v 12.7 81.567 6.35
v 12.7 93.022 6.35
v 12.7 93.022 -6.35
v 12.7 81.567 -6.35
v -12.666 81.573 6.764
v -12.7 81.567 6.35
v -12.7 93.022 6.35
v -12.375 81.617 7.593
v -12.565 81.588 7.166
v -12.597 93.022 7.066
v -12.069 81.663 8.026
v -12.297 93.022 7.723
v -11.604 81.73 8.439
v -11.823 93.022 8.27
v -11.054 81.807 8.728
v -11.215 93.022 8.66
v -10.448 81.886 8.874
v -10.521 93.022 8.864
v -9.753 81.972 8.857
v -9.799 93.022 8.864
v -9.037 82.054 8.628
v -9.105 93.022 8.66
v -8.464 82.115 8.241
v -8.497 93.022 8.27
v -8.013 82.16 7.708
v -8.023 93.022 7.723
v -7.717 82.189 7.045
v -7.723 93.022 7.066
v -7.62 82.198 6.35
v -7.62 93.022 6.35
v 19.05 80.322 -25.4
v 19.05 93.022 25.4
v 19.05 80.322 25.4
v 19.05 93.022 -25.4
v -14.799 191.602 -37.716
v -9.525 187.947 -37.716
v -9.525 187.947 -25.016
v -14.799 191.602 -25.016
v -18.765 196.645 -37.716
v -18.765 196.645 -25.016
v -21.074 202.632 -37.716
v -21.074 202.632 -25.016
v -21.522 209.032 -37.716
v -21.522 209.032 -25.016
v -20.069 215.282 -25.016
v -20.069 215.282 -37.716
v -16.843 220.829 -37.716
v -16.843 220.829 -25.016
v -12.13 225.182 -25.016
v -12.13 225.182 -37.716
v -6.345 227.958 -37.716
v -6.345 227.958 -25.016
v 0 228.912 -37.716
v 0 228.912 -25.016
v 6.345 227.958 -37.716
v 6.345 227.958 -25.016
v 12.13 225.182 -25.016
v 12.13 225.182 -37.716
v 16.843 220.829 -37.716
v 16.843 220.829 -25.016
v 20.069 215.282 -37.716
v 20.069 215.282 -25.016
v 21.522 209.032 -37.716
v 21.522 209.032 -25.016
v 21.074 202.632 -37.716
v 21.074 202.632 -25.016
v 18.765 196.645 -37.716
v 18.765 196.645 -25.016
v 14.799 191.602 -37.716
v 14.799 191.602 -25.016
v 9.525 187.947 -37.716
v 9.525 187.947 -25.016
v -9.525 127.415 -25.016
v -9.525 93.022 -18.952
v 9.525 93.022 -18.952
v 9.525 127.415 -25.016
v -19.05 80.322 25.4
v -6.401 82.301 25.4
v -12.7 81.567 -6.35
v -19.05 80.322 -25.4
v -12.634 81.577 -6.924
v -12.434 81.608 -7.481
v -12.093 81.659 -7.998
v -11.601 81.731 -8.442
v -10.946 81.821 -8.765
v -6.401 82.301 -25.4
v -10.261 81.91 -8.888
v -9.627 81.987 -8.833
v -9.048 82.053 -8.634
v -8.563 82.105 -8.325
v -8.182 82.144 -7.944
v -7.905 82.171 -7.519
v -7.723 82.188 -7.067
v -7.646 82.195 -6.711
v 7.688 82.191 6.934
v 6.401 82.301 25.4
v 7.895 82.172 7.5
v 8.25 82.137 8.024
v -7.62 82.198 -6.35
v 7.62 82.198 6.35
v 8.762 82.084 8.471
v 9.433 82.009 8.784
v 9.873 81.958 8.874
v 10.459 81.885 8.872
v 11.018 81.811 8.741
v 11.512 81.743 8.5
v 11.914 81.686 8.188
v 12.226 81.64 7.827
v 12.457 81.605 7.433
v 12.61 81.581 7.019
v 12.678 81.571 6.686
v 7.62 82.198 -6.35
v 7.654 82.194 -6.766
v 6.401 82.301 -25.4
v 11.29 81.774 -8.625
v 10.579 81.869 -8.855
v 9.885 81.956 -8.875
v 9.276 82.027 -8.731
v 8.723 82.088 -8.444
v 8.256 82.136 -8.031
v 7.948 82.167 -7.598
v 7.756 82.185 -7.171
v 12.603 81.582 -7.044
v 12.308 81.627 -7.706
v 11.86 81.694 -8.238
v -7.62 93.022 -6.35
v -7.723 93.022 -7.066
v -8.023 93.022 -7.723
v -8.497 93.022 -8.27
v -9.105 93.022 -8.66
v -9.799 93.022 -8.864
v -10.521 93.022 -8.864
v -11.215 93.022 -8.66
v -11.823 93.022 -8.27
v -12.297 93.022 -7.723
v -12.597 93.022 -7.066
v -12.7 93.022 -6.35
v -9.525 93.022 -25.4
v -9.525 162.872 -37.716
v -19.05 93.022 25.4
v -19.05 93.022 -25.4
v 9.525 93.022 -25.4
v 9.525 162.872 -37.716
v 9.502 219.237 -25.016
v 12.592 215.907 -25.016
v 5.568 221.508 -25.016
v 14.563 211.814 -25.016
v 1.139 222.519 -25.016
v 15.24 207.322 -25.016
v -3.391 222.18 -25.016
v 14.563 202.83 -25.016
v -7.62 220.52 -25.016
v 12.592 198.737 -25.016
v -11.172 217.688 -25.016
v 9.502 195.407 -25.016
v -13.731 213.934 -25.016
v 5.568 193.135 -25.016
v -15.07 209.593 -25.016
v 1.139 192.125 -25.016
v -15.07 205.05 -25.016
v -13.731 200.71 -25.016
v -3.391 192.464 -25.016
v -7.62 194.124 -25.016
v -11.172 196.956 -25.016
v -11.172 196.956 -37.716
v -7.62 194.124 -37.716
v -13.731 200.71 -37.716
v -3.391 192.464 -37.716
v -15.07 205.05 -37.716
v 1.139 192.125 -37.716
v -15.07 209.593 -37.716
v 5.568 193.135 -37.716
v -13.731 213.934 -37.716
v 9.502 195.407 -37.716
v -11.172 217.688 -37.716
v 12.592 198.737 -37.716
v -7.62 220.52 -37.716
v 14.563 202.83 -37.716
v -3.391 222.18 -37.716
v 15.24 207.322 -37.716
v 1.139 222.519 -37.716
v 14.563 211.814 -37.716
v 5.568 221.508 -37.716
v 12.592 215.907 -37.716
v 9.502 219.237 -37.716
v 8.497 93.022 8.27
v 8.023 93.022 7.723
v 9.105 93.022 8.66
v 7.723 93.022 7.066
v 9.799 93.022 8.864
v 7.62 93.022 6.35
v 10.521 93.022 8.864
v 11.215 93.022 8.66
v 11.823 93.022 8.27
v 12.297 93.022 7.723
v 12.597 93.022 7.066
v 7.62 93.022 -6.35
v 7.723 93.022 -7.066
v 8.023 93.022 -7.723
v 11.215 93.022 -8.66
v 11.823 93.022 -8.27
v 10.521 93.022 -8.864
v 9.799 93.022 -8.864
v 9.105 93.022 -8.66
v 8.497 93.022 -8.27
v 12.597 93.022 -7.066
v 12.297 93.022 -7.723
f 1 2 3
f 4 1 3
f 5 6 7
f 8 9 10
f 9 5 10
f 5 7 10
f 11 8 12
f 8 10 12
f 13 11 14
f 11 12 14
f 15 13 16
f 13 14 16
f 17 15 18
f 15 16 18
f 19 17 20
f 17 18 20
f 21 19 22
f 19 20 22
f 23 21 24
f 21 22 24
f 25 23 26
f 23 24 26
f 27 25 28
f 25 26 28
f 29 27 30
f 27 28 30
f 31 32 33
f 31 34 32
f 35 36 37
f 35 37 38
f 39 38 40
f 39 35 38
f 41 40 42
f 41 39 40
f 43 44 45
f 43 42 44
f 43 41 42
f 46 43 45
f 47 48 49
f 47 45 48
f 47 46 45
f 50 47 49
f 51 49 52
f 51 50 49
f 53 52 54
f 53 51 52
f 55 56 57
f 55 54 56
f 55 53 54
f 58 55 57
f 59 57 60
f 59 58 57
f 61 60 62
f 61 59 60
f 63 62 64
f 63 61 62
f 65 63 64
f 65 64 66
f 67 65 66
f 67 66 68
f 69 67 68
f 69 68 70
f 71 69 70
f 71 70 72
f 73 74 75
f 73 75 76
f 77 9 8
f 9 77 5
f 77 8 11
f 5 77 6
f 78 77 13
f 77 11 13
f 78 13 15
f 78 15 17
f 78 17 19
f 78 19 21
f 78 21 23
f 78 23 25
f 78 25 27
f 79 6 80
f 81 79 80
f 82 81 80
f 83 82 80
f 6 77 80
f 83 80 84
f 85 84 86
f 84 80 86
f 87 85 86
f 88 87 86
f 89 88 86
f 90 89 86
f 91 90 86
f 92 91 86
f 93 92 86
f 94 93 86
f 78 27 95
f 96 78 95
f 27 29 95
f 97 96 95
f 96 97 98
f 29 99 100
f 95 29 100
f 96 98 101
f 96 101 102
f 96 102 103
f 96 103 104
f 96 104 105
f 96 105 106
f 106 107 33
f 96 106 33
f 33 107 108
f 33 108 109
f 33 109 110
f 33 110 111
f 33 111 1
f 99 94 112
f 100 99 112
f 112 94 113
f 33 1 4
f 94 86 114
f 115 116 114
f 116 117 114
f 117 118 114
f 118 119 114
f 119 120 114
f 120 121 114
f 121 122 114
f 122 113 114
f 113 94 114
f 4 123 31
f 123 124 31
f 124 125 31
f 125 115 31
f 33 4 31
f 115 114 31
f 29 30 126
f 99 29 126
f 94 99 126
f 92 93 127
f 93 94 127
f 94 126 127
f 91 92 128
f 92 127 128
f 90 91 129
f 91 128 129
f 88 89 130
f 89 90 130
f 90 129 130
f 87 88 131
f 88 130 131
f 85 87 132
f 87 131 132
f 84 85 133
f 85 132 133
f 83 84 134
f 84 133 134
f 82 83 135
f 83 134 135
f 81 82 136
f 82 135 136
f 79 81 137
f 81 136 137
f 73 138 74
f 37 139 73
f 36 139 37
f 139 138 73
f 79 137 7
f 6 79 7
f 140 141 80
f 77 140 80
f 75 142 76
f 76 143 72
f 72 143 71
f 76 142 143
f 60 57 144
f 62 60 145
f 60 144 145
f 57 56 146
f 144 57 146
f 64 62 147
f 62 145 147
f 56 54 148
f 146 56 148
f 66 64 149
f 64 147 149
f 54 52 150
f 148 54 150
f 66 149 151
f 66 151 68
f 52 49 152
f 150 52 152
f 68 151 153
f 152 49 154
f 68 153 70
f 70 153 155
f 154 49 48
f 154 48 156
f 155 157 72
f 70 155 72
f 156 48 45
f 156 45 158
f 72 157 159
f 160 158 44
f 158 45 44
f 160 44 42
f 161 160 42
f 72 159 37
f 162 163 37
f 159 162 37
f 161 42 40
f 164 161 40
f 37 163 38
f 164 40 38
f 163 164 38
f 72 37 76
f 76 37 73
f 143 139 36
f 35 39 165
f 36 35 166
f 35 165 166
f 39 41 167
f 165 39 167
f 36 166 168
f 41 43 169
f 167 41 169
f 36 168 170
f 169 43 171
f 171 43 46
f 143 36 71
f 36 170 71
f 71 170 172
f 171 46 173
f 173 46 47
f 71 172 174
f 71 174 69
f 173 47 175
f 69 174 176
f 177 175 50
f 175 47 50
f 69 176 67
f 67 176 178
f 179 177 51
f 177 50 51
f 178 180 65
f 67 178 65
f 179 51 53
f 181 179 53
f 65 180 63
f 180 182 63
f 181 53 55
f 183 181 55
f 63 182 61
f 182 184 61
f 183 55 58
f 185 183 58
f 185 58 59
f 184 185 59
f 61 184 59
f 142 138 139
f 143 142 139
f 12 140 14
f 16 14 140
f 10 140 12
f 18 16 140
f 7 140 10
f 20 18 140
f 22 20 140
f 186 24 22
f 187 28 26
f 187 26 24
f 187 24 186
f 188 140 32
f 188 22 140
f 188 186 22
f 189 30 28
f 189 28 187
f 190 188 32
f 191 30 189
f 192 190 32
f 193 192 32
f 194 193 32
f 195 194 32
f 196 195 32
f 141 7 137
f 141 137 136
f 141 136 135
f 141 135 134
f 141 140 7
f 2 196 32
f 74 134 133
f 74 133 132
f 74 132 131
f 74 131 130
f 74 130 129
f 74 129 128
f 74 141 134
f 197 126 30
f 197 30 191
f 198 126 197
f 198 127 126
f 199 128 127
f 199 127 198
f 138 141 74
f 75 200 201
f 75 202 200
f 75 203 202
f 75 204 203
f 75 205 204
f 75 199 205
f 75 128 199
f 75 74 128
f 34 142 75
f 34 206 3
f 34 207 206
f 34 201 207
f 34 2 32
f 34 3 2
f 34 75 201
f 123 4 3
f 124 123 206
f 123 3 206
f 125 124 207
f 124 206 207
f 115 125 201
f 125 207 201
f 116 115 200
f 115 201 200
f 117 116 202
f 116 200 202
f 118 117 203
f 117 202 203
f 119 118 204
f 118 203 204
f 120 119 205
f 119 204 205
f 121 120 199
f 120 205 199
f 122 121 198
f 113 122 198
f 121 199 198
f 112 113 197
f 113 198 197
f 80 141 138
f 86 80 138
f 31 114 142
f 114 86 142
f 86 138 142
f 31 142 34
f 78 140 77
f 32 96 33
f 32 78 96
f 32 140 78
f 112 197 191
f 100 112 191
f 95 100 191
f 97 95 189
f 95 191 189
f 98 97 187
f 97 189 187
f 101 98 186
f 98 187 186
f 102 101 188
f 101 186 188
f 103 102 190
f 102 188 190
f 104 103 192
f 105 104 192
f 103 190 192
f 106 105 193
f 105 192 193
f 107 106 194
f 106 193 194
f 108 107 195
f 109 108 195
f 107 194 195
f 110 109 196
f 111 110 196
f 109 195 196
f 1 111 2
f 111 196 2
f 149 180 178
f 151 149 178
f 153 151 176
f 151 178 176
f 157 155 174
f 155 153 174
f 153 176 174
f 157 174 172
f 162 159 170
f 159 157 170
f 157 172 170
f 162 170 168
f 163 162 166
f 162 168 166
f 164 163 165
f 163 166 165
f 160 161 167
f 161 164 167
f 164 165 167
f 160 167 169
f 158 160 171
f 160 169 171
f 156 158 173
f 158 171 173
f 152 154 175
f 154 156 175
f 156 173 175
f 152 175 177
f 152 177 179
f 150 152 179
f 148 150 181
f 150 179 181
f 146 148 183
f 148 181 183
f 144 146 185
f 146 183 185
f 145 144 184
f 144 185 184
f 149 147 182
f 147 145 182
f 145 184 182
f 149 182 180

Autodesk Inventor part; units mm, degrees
ref_plane "Work Plane3" through (19.05, 80.3219, 25.4) normal (0, 1, 0) x (-1, 0, 0)
ref_plane "Work Plane4" through (0, 228.9119, -25.0164) normal (0, 1, 0) x (-1, 0, 0)
sketch "Sketch1" plane through (0, 0, 0) normal (0, 0, 1) x (1, 0, 0)
  arc A0 (19.05, 80.3219) -> (-19.05, 80.3219) centre (0, 0) ccw
  line L0 (0, 0) -> (0, 152.4) construction
  line L1 (0, 93.0219) -> (19.05, 93.0219)
  line L2 (19.05, 93.0219) -> (19.05, 80.3219)
  line L3 (0, 93.0219) -> (-19.05, 93.0219)
  line L4 (-19.05, 93.0219) -> (-19.05, 80.3219)
  dimension "telescopeTubeDiameter" = 165.1
  dimension "d1" = 152.4
  dimension "d2" = 19.05
  dimension "d3" = 12.7
extrude "Extrusion1" add sketch "Sketch1" along normal mid plane 50.8
sketch "Sketch2" plane through (-19.05, 93.0219, 25.4) normal (0, 1, 0) x (1, 0, 0)
  line L0 (38.1, 0) -> (0, 0) construction
  line L1 (19.05, 0) -> (19.05, 50.8) construction
  line L2 (0, 50.8) -> (38.1, 50.8) construction
  line L3 (0, 50.8) -> (0, 0) construction
  line L4 (0, 25.4) -> (38.1, 25.4) construction
  line L5 (38.1, 50.8) -> (38.1, 0) construction
  line L6 (29.21, 19.05) -> (29.21, 31.75) construction
  line L7 (31.75, 19.05) -> (31.75, 31.75)
  line L8 (26.67, 31.75) -> (26.67, 19.05)
  arc A0 (26.67, 19.05) -> (31.75, 19.05) centre (29.21, 19.05) ccw
  arc A1 (31.75, 31.75) -> (26.67, 31.75) centre (29.21, 31.75) ccw
  point P0 (19.05, 25.4)
  point P1 (29.21, 25.4)
  dimension "d6" = 0
  dimension "d7" = 10.16
  dimension "d8" = 6.35
  dimension "d11" = 5.08
extrude "Extrusion2" cut sketch "Sketch2" against normal through all
mirror "Mirror1" about plane through (0, 0, 0) normal (1, 0, 0) of "Extrusion2"
sketch "Sketch3" plane through (0, 0, 0) normal (1, 0, 0) x (0, 1, 0)
  line L0 (93.0219, 25.4) -> (93.0219, -25.4) projected
  line L1 (80.3219, -25.4) -> (93.0219, -25.4) projected
  line L2 (162.8719, -25.4) -> (162.8719, -37.137) construction
  line L3 (93.0219, -25.4) -> (162.8719, -37.7164)
  line L4 (93.0219, -25.4) -> (162.8719, -25.4) construction
  line L5 (93.0219, -18.952) -> (162.8719, -31.2685)
  line L6 (162.8719, -31.2685) -> (162.8719, -37.7164)
  point P0 (0, 0)
  dimension "d13" = 69.85
  dimension "d14" = 10
  dimension "d15" = 6.35
extrude "Extrusion3" add sketch "Sketch3" along normal mid plane 19.05
ref_plane "Work Plane1" through (9.525, 162.8719, -37.7164) normal (0, 0, 1) x (1, 0, 0)
sketch "Sketch4" plane through (9.525, 162.8719, -37.7164) normal (0, 0, 1) x (1, 0, 0)
  line L0 (0, 0) -> (-19.05, 0) projected
  line L1 (-19.05, 0) -> (0, 0) construction
  line L2 (-9.525, 0) -> (-9.525, 50.8) construction
  circle A0 centre (-9.525, 44.45) radius 15.24
  arc A1 (0, 25.0747) -> (-19.05, 25.0747) centre (-9.525, 44.45) ccw
  line L3 (0, 0) -> (0, 25.0747)
  line L4 (-19.05, 0) -> (-19.05, 25.0747)
  point P0 (-9.525, -162.8719)
  dimension "d18" = 50.8
  dimension "d19" = 30.48
  dimension "d20" = 6.35
  dimension "d25" = 44.45
extrude "Extrusion4" add sketch "Sketch4" along normal blind 12.7
sketch "Sketch7" plane through (0, 0, 0) normal (1, 0, 0) x (0, 1, 0)
  line L0 (93.0219, -18.952) -> (162.8719, -31.2685) projected
  line L1 (162.8719, -31.2685) -> (162.8719, -25.0164) projected
  line L2 (162.8719, -25.0164) -> (127.4148, -25.0164)
  line L3 (127.4148, -25.0164) -> (162.8719, -31.2685)
  line L4 (187.9465, -25.0164) -> (162.8719, -25.0164) projected
  line L5 (162.8719, -31.2685) -> (162.8719, -25.0164)
  point P0 (0, 0)
extrude "Extrusion5" add sketch "Sketch7" along normal mid plane 19.05
sketch "Sketch8" plane through (0, 0, 0) normal (1, 0, 0) x (0, 1, 0)
  line L0 (162.8719, 31.2685) -> (162.8719, 25.0164) projected
  line L1 (93.0219, 18.952) -> (162.8719, 31.2685) projected
  line L2 (162.8719, 25.0164) -> (127.4148, 25.0164)
  line L3 (127.4148, 25.0164) -> (162.8719, 31.2685)
  line L4 (162.8719, 31.2685) -> (162.8719, 25.0164)
  point P0 (0, 0)
sketch "Sketch9" plane through (0, 0, 0) normal (1, 0, 0) x (0, 1, 0)
  line L0 (187.9465, 25.0164) -> (127.4148, 25.0164) projected
  line L1 (93.0219, -18.952) -> (93.0219, -25.4) projected
  line L2 (93.0219, 18.952) -> (93.0219, -18.952)
  line L3 (93.0219, -18.952) -> (127.4148, -25.0164) projected
  line L4 (93.0219, -18.952) -> (127.4148, -25.0164)
  line L5 (187.9465, -25.0164) -> (127.4148, -25.0164) projected
  line L6 (127.4148, -25.0164) -> (187.9465, -25.0164)
  line L7 (187.9465, -25.0164) -> (187.9465, 25.0164)
  line L8 (93.0219, 18.952) -> (127.4148, 25.0164) projected
  line L9 (187.9465, 25.0164) -> (127.4148, 25.0164)
  point P0 (0, 0)
sketch "Sketch14" plane through (0, 228.9119, -25.0164) normal (0, 1, 0) x (-1, 0, 0)
  circle A0 centre (0, -6.35) radius 2.0193
  line L0 (21.59, -12.7) -> (-21.59, -12.7) projected
  circle A1 centre (0, 56.3829) radius 2.0193
  line L1 (21.59, 62.7329) -> (-21.59, 62.7329) projected
  point P0 (0, 25.0164)
  point P1 (-9.525, -12.7)
  point P2 (9.525, -12.7)
  point P3 (-9.525, 62.7329)
  point P4 (9.525, 62.7329)
  dimension "d74" = 4.0386
  dimension "d75" = 6.35
  dimension "d76" = 6.35
sketch "Sketch16" plane through (0, 222.4275, -31.3664) normal (-1, 0, 0) x (0, 0, 1)
  line L0 (2.0193, 0) -> (2.0193, 6.4844)
  line L1 (2.0193, 6.4844) -> (1.4308, 6.4844)
  line L2 (1.4308, 6.4844) -> (1.4308, 0)
  line L3 (1.4308, 0) -> (2.0193, 0)
  line L4 (0, -171.8239) -> (0, 36.2042) projected
sketch "Sketch15" plane through (0, 222.4275, -29.3471) normal (1, 0, 0) x (0, 1, 0)
  line L0 (-0.4631, -0.0403) -> (-0.397, -0.0403) construction
  line L1 (0.066, -0.5486) -> (-0.0001, -0.6756) construction
  line L2 (-0.7939, -0.6756) -> (-0.86, -0.5486) construction
  line L3 (-0.3308, -0.0403) -> (-0.397, 0.0868) construction
  line L4 (-0.397, 0.0868) -> (-0.4631, -0.0403) construction
  line L5 (-0.7939, -0.6756) -> (-0.7277, -0.5486) construction
  line L6 (-0.3308, -0.0403) -> (-0.0662, -0.5486)
  line L7 (-0.86, -0.5486) -> (-0.7277, -0.5486) construction
  arc A0 (-0.86, -0.5486) -> (-0.7939, -0.5887) centre (-0.7939, -0.5141) ccw construction
  line L8 (0.066, -0.5486) -> (-0.0662, -0.5486) construction
  line L9 (-0.7939, -0.6756) -> (-0.7939, -0.5486) construction
  line L10 (-0.0001, -0.6756) -> (-0.0001, -0.5486) construction
  line L11 (-0.397, 0.0868) -> (-0.397, -0.0002) construction
  line L12 (-0.7939, -0.5887) -> (-0.0001, -0.5887)
  arc A1 (-0.7939, -0.5887) -> (-0.7277, -0.5486) centre (-0.7939, -0.5141) ccw
  line L13 (-0.0662, -0.5486) -> (-0.0001, -0.6756) construction
  line L14 (-0.7277, -0.5486) -> (-0.4631, -0.0403)
  line L15 (-0.0001, -0.0002) -> (-0.0001, 0.0177)
  line L16 (-0.0001, 0.0177) -> (-0.0001, -0.0002)
  line L17 (-0.0001, -0.0002) -> (0.0334, -0.0002)
  arc A2 (-0.0662, -0.5486) -> (-0.0001, -0.5887) centre (-0.0001, -0.5141) ccw
  arc A3 (-0.0001, -0.5887) -> (0.066, -0.5486) centre (-0.0001, -0.5141) ccw construction
  arc A4 (-0.397, -0.0002) -> (-0.4631, -0.0403) centre (-0.397, -0.0747) ccw
  arc A5 (-0.3308, -0.0403) -> (-0.397, -0.0002) centre (-0.397, -0.0747) ccw
  line L18 (-0.397, -0.0002) -> (-0.397, -0.0403) construction
  line L19 (-0.397, -0.0403) -> (-0.3308, -0.0403) construction
  dimension "d94" = 55
  dimension "d95" = 0.1271
  dimension "d96" = 0.1271
  dimension "Sketch15_ThreadOffset" = 0
  dimension "Sketch15_MajorRadius" = 0.5885
  dimension "d99" = 0.7937
  dimension "Sketch15_MinorRadius" = 0
sketch "Sketch18" plane through (0, 222.4275, 31.3664) normal (-1, 0, 0) x (0, 0, 1)
  line L0 (2.0193, 0) -> (2.0193, 6.4844)
  line L1 (2.0193, 6.4844) -> (1.4308, 6.4844)
  line L2 (1.4308, 6.4844) -> (1.4308, 0)
  line L3 (1.4308, 0) -> (2.0193, 0)
  line L4 (0, -171.8765) -> (0, 36.5199) projected
sketch "Sketch17" plane through (0, 222.4275, 33.3857) normal (1, 0, 0) x (0, 1, 0)
  line L0 (-0.4631, -0.0403) -> (-0.397, -0.0403) construction
  line L1 (0.066, -0.5486) -> (-0.0001, -0.6756) construction
  line L2 (-0.7939, -0.6756) -> (-0.86, -0.5486) construction
  line L3 (-0.3308, -0.0403) -> (-0.397, 0.0868) construction
  line L4 (-0.397, 0.0868) -> (-0.4631, -0.0403) construction
  line L5 (-0.7939, -0.6756) -> (-0.7277, -0.5486) construction
  line L6 (-0.3308, -0.0403) -> (-0.0662, -0.5486)
  line L7 (-0.86, -0.5486) -> (-0.7277, -0.5486) construction
  arc A0 (-0.86, -0.5486) -> (-0.7939, -0.5887) centre (-0.7939, -0.5141) ccw construction
  line L8 (0.066, -0.5486) -> (-0.0662, -0.5486) construction
  line L9 (-0.7939, -0.6756) -> (-0.7939, -0.5486) construction
  line L10 (-0.0001, -0.6756) -> (-0.0001, -0.5486) construction
  line L11 (-0.397, 0.0868) -> (-0.397, -0.0002) construction
  line L12 (-0.7939, -0.5887) -> (-0.0001, -0.5887)
  arc A1 (-0.7939, -0.5887) -> (-0.7277, -0.5486) centre (-0.7939, -0.5141) ccw
  line L13 (-0.0662, -0.5486) -> (-0.0001, -0.6756) construction
  line L14 (-0.7277, -0.5486) -> (-0.4631, -0.0403)
  line L15 (-0.0001, -0.0002) -> (-0.0001, 0.0177)
  line L16 (-0.0001, 0.0177) -> (-0.0001, -0.0002)
  line L17 (-0.0001, -0.0002) -> (0.0334, -0.0002)
  arc A2 (-0.0662, -0.5486) -> (-0.0001, -0.5887) centre (-0.0001, -0.5141) ccw
  arc A3 (-0.0001, -0.5887) -> (0.066, -0.5486) centre (-0.0001, -0.5141) ccw construction
  arc A4 (-0.397, -0.0002) -> (-0.4631, -0.0403) centre (-0.397, -0.0747) ccw
  arc A5 (-0.3308, -0.0403) -> (-0.397, -0.0002) centre (-0.397, -0.0747) ccw
  line L18 (-0.397, -0.0002) -> (-0.397, -0.0403) construction
  line L19 (-0.397, -0.0403) -> (-0.3308, -0.0403) construction
  dimension "d112" = 55
  dimension "d113" = 0.1271
  dimension "d114" = 0.1271
  dimension "Sketch17_ThreadOffset" = 0
  dimension "Sketch17_MajorRadius" = 0.5885
  dimension "d117" = 0.7937
  dimension "Sketch17_MinorRadius" = 0
sketch "Sketch20" plane through (13.0819, 199.769, -31.3664) normal (0.5, 0.866, 0) x (0, 0, 1)
  line L0 (2.0193, 0) -> (2.0193, 6.4844)
  line L1 (2.0193, 6.4844) -> (1.4308, 6.4844)
  line L2 (1.4308, 6.4844) -> (1.4308, 0)
  line L3 (1.4308, 0) -> (2.0193, 0)
  line L4 (0, -67.0949) -> (0, 89.4563) projected
sketch "Sketch19" plane through (13.0819, 199.769, -29.3471) normal (-0.5, -0.866, 0) x (0.866, -0.5, 0)
  line L0 (-0.4631, -0.0403) -> (-0.397, -0.0403) construction
  line L1 (0.066, -0.5486) -> (-0.0001, -0.6756) construction
  line L2 (-0.7939, -0.6756) -> (-0.86, -0.5486) construction
  line L3 (-0.3308, -0.0403) -> (-0.397, 0.0868) construction
  line L4 (-0.397, 0.0868) -> (-0.4631, -0.0403) construction
  line L5 (-0.7939, -0.6756) -> (-0.7277, -0.5486) construction
  line L6 (-0.3308, -0.0403) -> (-0.0662, -0.5486)
  line L7 (-0.86, -0.5486) -> (-0.7277, -0.5486) construction
  arc A0 (-0.86, -0.5486) -> (-0.7939, -0.5887) centre (-0.7939, -0.5141) ccw construction
  line L8 (0.066, -0.5486) -> (-0.0662, -0.5486) construction
  line L9 (-0.7939, -0.6756) -> (-0.7939, -0.5486) construction
  line L10 (-0.0001, -0.6756) -> (-0.0001, -0.5486) construction
  line L11 (-0.397, 0.0868) -> (-0.397, -0.0002) construction
  line L12 (-0.7939, -0.5887) -> (-0.0001, -0.5887)
  arc A1 (-0.7939, -0.5887) -> (-0.7277, -0.5486) centre (-0.7939, -0.5141) ccw
  line L13 (-0.0662, -0.5486) -> (-0.0001, -0.6756) construction
  line L14 (-0.7277, -0.5486) -> (-0.4631, -0.0403)
  line L15 (-0.0001, -0.0002) -> (-0.0001, 0.0177)
  line L16 (-0.0001, 0.0177) -> (-0.0001, -0.0002)
  line L17 (-0.0001, -0.0002) -> (0.0334, -0.0002)
  arc A2 (-0.0662, -0.5486) -> (-0.0001, -0.5887) centre (-0.0001, -0.5141) ccw
  arc A3 (-0.0001, -0.5887) -> (0.066, -0.5486) centre (-0.0001, -0.5141) ccw construction
  arc A4 (-0.397, -0.0002) -> (-0.4631, -0.0403) centre (-0.397, -0.0747) ccw
  arc A5 (-0.3308, -0.0403) -> (-0.397, -0.0002) centre (-0.397, -0.0747) ccw
  line L18 (-0.397, -0.0002) -> (-0.397, -0.0403) construction
  line L19 (-0.397, -0.0403) -> (-0.3308, -0.0403) construction
  dimension "d130" = 55
  dimension "d131" = 0.1271
  dimension "d132" = 0.1271
  dimension "Sketch19_ThreadOffset" = 0
  dimension "Sketch19_MajorRadius" = 0.5885
  dimension "d135" = 0.7937
  dimension "Sketch19_MinorRadius" = 0
sketch "Sketch22" plane through (-13.0819, 199.769, -31.3664) normal (0.5, -0.866, 0) x (0, 0, 1)
  line L0 (2.0193, 0) -> (2.0193, 6.4844)
  line L1 (2.0193, 6.4844) -> (1.4308, 6.4844)
  line L2 (1.4308, 6.4844) -> (1.4308, 0)
  line L3 (1.4308, 0) -> (2.0193, 0)
  line L4 (0, -67.0949) -> (0, 89.4563) projected
sketch "Sketch21" plane through (-13.0819, 199.769, -29.3471) normal (-0.5, 0.866, 0) x (-0.866, -0.5, 0)
  line L0 (-0.4631, -0.0403) -> (-0.397, -0.0403) construction
  line L1 (0.066, -0.5486) -> (-0.0001, -0.6756) construction
  line L2 (-0.7939, -0.6756) -> (-0.86, -0.5486) construction
  line L3 (-0.3308, -0.0403) -> (-0.397, 0.0868) construction
  line L4 (-0.397, 0.0868) -> (-0.4631, -0.0403) construction
  line L5 (-0.7939, -0.6756) -> (-0.7277, -0.5486) construction
  line L6 (-0.3308, -0.0403) -> (-0.0662, -0.5486)
  line L7 (-0.86, -0.5486) -> (-0.7277, -0.5486) construction
  arc A0 (-0.86, -0.5486) -> (-0.7939, -0.5887) centre (-0.7939, -0.5141) ccw construction
  line L8 (0.066, -0.5486) -> (-0.0662, -0.5486) construction
  line L9 (-0.7939, -0.6756) -> (-0.7939, -0.5486) construction
  line L10 (-0.0001, -0.6756) -> (-0.0001, -0.5486) construction
  line L11 (-0.397, 0.0868) -> (-0.397, -0.0002) construction
  line L12 (-0.7939, -0.5887) -> (-0.0001, -0.5887)
  arc A1 (-0.7939, -0.5887) -> (-0.7277, -0.5486) centre (-0.7939, -0.5141) ccw
  line L13 (-0.0662, -0.5486) -> (-0.0001, -0.6756) construction
  line L14 (-0.7277, -0.5486) -> (-0.4631, -0.0403)
  line L15 (-0.0001, -0.0002) -> (-0.0001, 0.0177)
  line L16 (-0.0001, 0.0177) -> (-0.0001, -0.0002)
  line L17 (-0.0001, -0.0002) -> (0.0334, -0.0002)
  arc A2 (-0.0662, -0.5486) -> (-0.0001, -0.5887) centre (-0.0001, -0.5141) ccw
  arc A3 (-0.0001, -0.5887) -> (0.066, -0.5486) centre (-0.0001, -0.5141) ccw construction
  arc A4 (-0.397, -0.0002) -> (-0.4631, -0.0403) centre (-0.397, -0.0747) ccw
  arc A5 (-0.3308, -0.0403) -> (-0.397, -0.0002) centre (-0.397, -0.0747) ccw
  line L18 (-0.397, -0.0002) -> (-0.397, -0.0403) construction
  line L19 (-0.397, -0.0403) -> (-0.3308, -0.0403) construction
  dimension "d148" = 55
  dimension "d149" = 0.1271
  dimension "d150" = 0.1271
  dimension "Sketch21_ThreadOffset" = 0
  dimension "Sketch21_MajorRadius" = 0.5885
  dimension "d153" = 0.7937
  dimension "Sketch21_MinorRadius" = 0
sketch "Sketch24" plane through (13.0819, 199.769, 31.3664) normal (0.5, 0.866, 0) x (0, 0, 1)
  line L0 (2.0193, 0) -> (2.0193, 6.4844)
  line L1 (2.0193, 6.4844) -> (1.4308, 6.4844)
  line L2 (1.4308, 6.4844) -> (1.4308, 0)
  line L3 (1.4308, 0) -> (2.0193, 0)
  line L4 (0, -67.0949) -> (0, 89.4563) projected
sketch "Sketch23" plane through (13.0819, 199.769, 33.3857) normal (-0.5, -0.866, 0) x (0.866, -0.5, 0)
  line L0 (-0.4631, -0.0403) -> (-0.397, -0.0403) construction
  line L1 (0.066, -0.5486) -> (-0.0001, -0.6756) construction
  line L2 (-0.7939, -0.6756) -> (-0.86, -0.5486) construction
  line L3 (-0.3308, -0.0403) -> (-0.397, 0.0868) construction
  line L4 (-0.397, 0.0868) -> (-0.4631, -0.0403) construction
  line L5 (-0.7939, -0.6756) -> (-0.7277, -0.5486) construction
  line L6 (-0.3308, -0.0403) -> (-0.0662, -0.5486)
  line L7 (-0.86, -0.5486) -> (-0.7277, -0.5486) construction
  arc A0 (-0.86, -0.5486) -> (-0.7939, -0.5887) centre (-0.7939, -0.5141) ccw construction
  line L8 (0.066, -0.5486) -> (-0.0662, -0.5486) construction
  line L9 (-0.7939, -0.6756) -> (-0.7939, -0.5486) construction
  line L10 (-0.0001, -0.6756) -> (-0.0001, -0.5486) construction
  line L11 (-0.397, 0.0868) -> (-0.397, -0.0002) construction
  line L12 (-0.7939, -0.5887) -> (-0.0001, -0.5887)
  arc A1 (-0.7939, -0.5887) -> (-0.7277, -0.5486) centre (-0.7939, -0.5141) ccw
  line L13 (-0.0662, -0.5486) -> (-0.0001, -0.6756) construction
  line L14 (-0.7277, -0.5486) -> (-0.4631, -0.0403)
  line L15 (-0.0001, -0.0002) -> (-0.0001, 0.0177)
  line L16 (-0.0001, 0.0177) -> (-0.0001, -0.0002)
  line L17 (-0.0001, -0.0002) -> (0.0334, -0.0002)
  arc A2 (-0.0662, -0.5486) -> (-0.0001, -0.5887) centre (-0.0001, -0.5141) ccw
  arc A3 (-0.0001, -0.5887) -> (0.066, -0.5486) centre (-0.0001, -0.5141) ccw construction
  arc A4 (-0.397, -0.0002) -> (-0.4631, -0.0403) centre (-0.397, -0.0747) ccw
  arc A5 (-0.3308, -0.0403) -> (-0.397, -0.0002) centre (-0.397, -0.0747) ccw
  line L18 (-0.397, -0.0002) -> (-0.397, -0.0403) construction
  line L19 (-0.397, -0.0403) -> (-0.3308, -0.0403) construction
  dimension "d166" = 55
  dimension "d167" = 0.1271
  dimension "d168" = 0.1271
  dimension "Sketch23_ThreadOffset" = 0
  dimension "Sketch23_MajorRadius" = 0.5885
  dimension "d171" = 0.7937
  dimension "Sketch23_MinorRadius" = 0
sketch "Sketch26" plane through (-13.0819, 199.769, 31.3664) normal (0.5, -0.866, 0) x (0, 0, 1)
  line L0 (2.0193, 0) -> (2.0193, 6.4844)
  line L1 (2.0193, 6.4844) -> (1.4308, 6.4844)
  line L2 (1.4308, 6.4844) -> (1.4308, 0)
  line L3 (1.4308, 0) -> (2.0193, 0)
  line L4 (0, -67.0949) -> (0, 89.4563) projected
sketch "Sketch25" plane through (-13.0819, 199.769, 33.3857) normal (-0.5, 0.866, 0) x (-0.866, -0.5, 0)
  line L0 (-0.4631, -0.0403) -> (-0.397, -0.0403) construction
  line L1 (0.066, -0.5486) -> (-0.0001, -0.6756) construction
  line L2 (-0.7939, -0.6756) -> (-0.86, -0.5486) construction
  line L3 (-0.3308, -0.0403) -> (-0.397, 0.0868) construction
  line L4 (-0.397, 0.0868) -> (-0.4631, -0.0403) construction
  line L5 (-0.7939, -0.6756) -> (-0.7277, -0.5486) construction
  line L6 (-0.3308, -0.0403) -> (-0.0662, -0.5486)
  line L7 (-0.86, -0.5486) -> (-0.7277, -0.5486) construction
  arc A0 (-0.86, -0.5486) -> (-0.7939, -0.5887) centre (-0.7939, -0.5141) ccw construction
  line L8 (0.066, -0.5486) -> (-0.0662, -0.5486) construction
  line L9 (-0.7939, -0.6756) -> (-0.7939, -0.5486) construction
  line L10 (-0.0001, -0.6756) -> (-0.0001, -0.5486) construction
  line L11 (-0.397, 0.0868) -> (-0.397, -0.0002) construction
  line L12 (-0.7939, -0.5887) -> (-0.0001, -0.5887)
  arc A1 (-0.7939, -0.5887) -> (-0.7277, -0.5486) centre (-0.7939, -0.5141) ccw
  line L13 (-0.0662, -0.5486) -> (-0.0001, -0.6756) construction
  line L14 (-0.7277, -0.5486) -> (-0.4631, -0.0403)
  line L15 (-0.0001, -0.0002) -> (-0.0001, 0.0177)
  line L16 (-0.0001, 0.0177) -> (-0.0001, -0.0002)
  line L17 (-0.0001, -0.0002) -> (0.0334, -0.0002)
  arc A2 (-0.0662, -0.5486) -> (-0.0001, -0.5887) centre (-0.0001, -0.5141) ccw
  arc A3 (-0.0001, -0.5887) -> (0.066, -0.5486) centre (-0.0001, -0.5141) ccw construction
  arc A4 (-0.397, -0.0002) -> (-0.4631, -0.0403) centre (-0.397, -0.0747) ccw
  arc A5 (-0.3308, -0.0403) -> (-0.397, -0.0002) centre (-0.397, -0.0747) ccw
  line L18 (-0.397, -0.0002) -> (-0.397, -0.0403) construction
  line L19 (-0.397, -0.0403) -> (-0.3308, -0.0403) construction
  dimension "d184" = 55
  dimension "d185" = 0.1271
  dimension "d186" = 0.1271
  dimension "Sketch25_ThreadOffset" = 0
  dimension "Sketch25_MajorRadius" = 0.5885
  dimension "d189" = 0.7937
  dimension "Sketch25_MinorRadius" = 0
equation "\"d94\" = d101"
equation "\"d95\" = 0.160083 * Sketch15_Pitch"
equation "\"d96\" = 0.160083 * Sketch15_Pitch"
equation "\"d99\" = Sketch15_Pitch"
equation "\"d112\" = d119"
equation "\"d113\" = 0.160083 * Sketch17_Pitch"
equation "\"d114\" = 0.160083 * Sketch17_Pitch"
equation "\"d117\" = Sketch17_Pitch"
equation "\"d130\" = d137"
equation "\"d131\" = 0.160083 * Sketch19_Pitch"
equation "\"d132\" = 0.160083 * Sketch19_Pitch"
equation "\"d135\" = Sketch19_Pitch"
equation "\"d148\" = d155"
equation "\"d149\" = 0.160083 * Sketch21_Pitch"
equation "\"d150\" = 0.160083 * Sketch21_Pitch"
equation "\"d153\" = Sketch21_Pitch"
equation "\"d166\" = d173"
equation "\"d167\" = 0.160083 * Sketch23_Pitch"
equation "\"d168\" = 0.160083 * Sketch23_Pitch"
equation "\"d171\" = Sketch23_Pitch"
equation "\"d184\" = d191"
equation "\"d185\" = 0.160083 * Sketch25_Pitch"
equation "\"d186\" = 0.160083 * Sketch25_Pitch"
equation "\"d189\" = Sketch25_Pitch"
equation "\"d62\" = 0.125 * Sketch12_Pitch"
equation "\"Sketch12_Pitch\" = 0.79375"
equation "\"d64\" = 60deg"
equation "\"d101\" = 55deg"
equation "\"Sketch15_Pitch\" = 0.79375"
equation "\"d119\" = 55deg"
equation "\"Sketch17_Pitch\" = 0.79375"
equation "\"d137\" = 55deg"
equation "\"Sketch19_Pitch\" = 0.79375"
equation "\"d155\" = 55deg"
equation "\"Sketch21_Pitch\" = 0.79375"
equation "\"d173\" = 55deg"
equation "\"Sketch23_Pitch\" = 0.79375"
equation "\"d191\" = 55deg"
equation "\"Sketch25_Pitch\" = 0.79375"
properties part number "testBasePrint"
